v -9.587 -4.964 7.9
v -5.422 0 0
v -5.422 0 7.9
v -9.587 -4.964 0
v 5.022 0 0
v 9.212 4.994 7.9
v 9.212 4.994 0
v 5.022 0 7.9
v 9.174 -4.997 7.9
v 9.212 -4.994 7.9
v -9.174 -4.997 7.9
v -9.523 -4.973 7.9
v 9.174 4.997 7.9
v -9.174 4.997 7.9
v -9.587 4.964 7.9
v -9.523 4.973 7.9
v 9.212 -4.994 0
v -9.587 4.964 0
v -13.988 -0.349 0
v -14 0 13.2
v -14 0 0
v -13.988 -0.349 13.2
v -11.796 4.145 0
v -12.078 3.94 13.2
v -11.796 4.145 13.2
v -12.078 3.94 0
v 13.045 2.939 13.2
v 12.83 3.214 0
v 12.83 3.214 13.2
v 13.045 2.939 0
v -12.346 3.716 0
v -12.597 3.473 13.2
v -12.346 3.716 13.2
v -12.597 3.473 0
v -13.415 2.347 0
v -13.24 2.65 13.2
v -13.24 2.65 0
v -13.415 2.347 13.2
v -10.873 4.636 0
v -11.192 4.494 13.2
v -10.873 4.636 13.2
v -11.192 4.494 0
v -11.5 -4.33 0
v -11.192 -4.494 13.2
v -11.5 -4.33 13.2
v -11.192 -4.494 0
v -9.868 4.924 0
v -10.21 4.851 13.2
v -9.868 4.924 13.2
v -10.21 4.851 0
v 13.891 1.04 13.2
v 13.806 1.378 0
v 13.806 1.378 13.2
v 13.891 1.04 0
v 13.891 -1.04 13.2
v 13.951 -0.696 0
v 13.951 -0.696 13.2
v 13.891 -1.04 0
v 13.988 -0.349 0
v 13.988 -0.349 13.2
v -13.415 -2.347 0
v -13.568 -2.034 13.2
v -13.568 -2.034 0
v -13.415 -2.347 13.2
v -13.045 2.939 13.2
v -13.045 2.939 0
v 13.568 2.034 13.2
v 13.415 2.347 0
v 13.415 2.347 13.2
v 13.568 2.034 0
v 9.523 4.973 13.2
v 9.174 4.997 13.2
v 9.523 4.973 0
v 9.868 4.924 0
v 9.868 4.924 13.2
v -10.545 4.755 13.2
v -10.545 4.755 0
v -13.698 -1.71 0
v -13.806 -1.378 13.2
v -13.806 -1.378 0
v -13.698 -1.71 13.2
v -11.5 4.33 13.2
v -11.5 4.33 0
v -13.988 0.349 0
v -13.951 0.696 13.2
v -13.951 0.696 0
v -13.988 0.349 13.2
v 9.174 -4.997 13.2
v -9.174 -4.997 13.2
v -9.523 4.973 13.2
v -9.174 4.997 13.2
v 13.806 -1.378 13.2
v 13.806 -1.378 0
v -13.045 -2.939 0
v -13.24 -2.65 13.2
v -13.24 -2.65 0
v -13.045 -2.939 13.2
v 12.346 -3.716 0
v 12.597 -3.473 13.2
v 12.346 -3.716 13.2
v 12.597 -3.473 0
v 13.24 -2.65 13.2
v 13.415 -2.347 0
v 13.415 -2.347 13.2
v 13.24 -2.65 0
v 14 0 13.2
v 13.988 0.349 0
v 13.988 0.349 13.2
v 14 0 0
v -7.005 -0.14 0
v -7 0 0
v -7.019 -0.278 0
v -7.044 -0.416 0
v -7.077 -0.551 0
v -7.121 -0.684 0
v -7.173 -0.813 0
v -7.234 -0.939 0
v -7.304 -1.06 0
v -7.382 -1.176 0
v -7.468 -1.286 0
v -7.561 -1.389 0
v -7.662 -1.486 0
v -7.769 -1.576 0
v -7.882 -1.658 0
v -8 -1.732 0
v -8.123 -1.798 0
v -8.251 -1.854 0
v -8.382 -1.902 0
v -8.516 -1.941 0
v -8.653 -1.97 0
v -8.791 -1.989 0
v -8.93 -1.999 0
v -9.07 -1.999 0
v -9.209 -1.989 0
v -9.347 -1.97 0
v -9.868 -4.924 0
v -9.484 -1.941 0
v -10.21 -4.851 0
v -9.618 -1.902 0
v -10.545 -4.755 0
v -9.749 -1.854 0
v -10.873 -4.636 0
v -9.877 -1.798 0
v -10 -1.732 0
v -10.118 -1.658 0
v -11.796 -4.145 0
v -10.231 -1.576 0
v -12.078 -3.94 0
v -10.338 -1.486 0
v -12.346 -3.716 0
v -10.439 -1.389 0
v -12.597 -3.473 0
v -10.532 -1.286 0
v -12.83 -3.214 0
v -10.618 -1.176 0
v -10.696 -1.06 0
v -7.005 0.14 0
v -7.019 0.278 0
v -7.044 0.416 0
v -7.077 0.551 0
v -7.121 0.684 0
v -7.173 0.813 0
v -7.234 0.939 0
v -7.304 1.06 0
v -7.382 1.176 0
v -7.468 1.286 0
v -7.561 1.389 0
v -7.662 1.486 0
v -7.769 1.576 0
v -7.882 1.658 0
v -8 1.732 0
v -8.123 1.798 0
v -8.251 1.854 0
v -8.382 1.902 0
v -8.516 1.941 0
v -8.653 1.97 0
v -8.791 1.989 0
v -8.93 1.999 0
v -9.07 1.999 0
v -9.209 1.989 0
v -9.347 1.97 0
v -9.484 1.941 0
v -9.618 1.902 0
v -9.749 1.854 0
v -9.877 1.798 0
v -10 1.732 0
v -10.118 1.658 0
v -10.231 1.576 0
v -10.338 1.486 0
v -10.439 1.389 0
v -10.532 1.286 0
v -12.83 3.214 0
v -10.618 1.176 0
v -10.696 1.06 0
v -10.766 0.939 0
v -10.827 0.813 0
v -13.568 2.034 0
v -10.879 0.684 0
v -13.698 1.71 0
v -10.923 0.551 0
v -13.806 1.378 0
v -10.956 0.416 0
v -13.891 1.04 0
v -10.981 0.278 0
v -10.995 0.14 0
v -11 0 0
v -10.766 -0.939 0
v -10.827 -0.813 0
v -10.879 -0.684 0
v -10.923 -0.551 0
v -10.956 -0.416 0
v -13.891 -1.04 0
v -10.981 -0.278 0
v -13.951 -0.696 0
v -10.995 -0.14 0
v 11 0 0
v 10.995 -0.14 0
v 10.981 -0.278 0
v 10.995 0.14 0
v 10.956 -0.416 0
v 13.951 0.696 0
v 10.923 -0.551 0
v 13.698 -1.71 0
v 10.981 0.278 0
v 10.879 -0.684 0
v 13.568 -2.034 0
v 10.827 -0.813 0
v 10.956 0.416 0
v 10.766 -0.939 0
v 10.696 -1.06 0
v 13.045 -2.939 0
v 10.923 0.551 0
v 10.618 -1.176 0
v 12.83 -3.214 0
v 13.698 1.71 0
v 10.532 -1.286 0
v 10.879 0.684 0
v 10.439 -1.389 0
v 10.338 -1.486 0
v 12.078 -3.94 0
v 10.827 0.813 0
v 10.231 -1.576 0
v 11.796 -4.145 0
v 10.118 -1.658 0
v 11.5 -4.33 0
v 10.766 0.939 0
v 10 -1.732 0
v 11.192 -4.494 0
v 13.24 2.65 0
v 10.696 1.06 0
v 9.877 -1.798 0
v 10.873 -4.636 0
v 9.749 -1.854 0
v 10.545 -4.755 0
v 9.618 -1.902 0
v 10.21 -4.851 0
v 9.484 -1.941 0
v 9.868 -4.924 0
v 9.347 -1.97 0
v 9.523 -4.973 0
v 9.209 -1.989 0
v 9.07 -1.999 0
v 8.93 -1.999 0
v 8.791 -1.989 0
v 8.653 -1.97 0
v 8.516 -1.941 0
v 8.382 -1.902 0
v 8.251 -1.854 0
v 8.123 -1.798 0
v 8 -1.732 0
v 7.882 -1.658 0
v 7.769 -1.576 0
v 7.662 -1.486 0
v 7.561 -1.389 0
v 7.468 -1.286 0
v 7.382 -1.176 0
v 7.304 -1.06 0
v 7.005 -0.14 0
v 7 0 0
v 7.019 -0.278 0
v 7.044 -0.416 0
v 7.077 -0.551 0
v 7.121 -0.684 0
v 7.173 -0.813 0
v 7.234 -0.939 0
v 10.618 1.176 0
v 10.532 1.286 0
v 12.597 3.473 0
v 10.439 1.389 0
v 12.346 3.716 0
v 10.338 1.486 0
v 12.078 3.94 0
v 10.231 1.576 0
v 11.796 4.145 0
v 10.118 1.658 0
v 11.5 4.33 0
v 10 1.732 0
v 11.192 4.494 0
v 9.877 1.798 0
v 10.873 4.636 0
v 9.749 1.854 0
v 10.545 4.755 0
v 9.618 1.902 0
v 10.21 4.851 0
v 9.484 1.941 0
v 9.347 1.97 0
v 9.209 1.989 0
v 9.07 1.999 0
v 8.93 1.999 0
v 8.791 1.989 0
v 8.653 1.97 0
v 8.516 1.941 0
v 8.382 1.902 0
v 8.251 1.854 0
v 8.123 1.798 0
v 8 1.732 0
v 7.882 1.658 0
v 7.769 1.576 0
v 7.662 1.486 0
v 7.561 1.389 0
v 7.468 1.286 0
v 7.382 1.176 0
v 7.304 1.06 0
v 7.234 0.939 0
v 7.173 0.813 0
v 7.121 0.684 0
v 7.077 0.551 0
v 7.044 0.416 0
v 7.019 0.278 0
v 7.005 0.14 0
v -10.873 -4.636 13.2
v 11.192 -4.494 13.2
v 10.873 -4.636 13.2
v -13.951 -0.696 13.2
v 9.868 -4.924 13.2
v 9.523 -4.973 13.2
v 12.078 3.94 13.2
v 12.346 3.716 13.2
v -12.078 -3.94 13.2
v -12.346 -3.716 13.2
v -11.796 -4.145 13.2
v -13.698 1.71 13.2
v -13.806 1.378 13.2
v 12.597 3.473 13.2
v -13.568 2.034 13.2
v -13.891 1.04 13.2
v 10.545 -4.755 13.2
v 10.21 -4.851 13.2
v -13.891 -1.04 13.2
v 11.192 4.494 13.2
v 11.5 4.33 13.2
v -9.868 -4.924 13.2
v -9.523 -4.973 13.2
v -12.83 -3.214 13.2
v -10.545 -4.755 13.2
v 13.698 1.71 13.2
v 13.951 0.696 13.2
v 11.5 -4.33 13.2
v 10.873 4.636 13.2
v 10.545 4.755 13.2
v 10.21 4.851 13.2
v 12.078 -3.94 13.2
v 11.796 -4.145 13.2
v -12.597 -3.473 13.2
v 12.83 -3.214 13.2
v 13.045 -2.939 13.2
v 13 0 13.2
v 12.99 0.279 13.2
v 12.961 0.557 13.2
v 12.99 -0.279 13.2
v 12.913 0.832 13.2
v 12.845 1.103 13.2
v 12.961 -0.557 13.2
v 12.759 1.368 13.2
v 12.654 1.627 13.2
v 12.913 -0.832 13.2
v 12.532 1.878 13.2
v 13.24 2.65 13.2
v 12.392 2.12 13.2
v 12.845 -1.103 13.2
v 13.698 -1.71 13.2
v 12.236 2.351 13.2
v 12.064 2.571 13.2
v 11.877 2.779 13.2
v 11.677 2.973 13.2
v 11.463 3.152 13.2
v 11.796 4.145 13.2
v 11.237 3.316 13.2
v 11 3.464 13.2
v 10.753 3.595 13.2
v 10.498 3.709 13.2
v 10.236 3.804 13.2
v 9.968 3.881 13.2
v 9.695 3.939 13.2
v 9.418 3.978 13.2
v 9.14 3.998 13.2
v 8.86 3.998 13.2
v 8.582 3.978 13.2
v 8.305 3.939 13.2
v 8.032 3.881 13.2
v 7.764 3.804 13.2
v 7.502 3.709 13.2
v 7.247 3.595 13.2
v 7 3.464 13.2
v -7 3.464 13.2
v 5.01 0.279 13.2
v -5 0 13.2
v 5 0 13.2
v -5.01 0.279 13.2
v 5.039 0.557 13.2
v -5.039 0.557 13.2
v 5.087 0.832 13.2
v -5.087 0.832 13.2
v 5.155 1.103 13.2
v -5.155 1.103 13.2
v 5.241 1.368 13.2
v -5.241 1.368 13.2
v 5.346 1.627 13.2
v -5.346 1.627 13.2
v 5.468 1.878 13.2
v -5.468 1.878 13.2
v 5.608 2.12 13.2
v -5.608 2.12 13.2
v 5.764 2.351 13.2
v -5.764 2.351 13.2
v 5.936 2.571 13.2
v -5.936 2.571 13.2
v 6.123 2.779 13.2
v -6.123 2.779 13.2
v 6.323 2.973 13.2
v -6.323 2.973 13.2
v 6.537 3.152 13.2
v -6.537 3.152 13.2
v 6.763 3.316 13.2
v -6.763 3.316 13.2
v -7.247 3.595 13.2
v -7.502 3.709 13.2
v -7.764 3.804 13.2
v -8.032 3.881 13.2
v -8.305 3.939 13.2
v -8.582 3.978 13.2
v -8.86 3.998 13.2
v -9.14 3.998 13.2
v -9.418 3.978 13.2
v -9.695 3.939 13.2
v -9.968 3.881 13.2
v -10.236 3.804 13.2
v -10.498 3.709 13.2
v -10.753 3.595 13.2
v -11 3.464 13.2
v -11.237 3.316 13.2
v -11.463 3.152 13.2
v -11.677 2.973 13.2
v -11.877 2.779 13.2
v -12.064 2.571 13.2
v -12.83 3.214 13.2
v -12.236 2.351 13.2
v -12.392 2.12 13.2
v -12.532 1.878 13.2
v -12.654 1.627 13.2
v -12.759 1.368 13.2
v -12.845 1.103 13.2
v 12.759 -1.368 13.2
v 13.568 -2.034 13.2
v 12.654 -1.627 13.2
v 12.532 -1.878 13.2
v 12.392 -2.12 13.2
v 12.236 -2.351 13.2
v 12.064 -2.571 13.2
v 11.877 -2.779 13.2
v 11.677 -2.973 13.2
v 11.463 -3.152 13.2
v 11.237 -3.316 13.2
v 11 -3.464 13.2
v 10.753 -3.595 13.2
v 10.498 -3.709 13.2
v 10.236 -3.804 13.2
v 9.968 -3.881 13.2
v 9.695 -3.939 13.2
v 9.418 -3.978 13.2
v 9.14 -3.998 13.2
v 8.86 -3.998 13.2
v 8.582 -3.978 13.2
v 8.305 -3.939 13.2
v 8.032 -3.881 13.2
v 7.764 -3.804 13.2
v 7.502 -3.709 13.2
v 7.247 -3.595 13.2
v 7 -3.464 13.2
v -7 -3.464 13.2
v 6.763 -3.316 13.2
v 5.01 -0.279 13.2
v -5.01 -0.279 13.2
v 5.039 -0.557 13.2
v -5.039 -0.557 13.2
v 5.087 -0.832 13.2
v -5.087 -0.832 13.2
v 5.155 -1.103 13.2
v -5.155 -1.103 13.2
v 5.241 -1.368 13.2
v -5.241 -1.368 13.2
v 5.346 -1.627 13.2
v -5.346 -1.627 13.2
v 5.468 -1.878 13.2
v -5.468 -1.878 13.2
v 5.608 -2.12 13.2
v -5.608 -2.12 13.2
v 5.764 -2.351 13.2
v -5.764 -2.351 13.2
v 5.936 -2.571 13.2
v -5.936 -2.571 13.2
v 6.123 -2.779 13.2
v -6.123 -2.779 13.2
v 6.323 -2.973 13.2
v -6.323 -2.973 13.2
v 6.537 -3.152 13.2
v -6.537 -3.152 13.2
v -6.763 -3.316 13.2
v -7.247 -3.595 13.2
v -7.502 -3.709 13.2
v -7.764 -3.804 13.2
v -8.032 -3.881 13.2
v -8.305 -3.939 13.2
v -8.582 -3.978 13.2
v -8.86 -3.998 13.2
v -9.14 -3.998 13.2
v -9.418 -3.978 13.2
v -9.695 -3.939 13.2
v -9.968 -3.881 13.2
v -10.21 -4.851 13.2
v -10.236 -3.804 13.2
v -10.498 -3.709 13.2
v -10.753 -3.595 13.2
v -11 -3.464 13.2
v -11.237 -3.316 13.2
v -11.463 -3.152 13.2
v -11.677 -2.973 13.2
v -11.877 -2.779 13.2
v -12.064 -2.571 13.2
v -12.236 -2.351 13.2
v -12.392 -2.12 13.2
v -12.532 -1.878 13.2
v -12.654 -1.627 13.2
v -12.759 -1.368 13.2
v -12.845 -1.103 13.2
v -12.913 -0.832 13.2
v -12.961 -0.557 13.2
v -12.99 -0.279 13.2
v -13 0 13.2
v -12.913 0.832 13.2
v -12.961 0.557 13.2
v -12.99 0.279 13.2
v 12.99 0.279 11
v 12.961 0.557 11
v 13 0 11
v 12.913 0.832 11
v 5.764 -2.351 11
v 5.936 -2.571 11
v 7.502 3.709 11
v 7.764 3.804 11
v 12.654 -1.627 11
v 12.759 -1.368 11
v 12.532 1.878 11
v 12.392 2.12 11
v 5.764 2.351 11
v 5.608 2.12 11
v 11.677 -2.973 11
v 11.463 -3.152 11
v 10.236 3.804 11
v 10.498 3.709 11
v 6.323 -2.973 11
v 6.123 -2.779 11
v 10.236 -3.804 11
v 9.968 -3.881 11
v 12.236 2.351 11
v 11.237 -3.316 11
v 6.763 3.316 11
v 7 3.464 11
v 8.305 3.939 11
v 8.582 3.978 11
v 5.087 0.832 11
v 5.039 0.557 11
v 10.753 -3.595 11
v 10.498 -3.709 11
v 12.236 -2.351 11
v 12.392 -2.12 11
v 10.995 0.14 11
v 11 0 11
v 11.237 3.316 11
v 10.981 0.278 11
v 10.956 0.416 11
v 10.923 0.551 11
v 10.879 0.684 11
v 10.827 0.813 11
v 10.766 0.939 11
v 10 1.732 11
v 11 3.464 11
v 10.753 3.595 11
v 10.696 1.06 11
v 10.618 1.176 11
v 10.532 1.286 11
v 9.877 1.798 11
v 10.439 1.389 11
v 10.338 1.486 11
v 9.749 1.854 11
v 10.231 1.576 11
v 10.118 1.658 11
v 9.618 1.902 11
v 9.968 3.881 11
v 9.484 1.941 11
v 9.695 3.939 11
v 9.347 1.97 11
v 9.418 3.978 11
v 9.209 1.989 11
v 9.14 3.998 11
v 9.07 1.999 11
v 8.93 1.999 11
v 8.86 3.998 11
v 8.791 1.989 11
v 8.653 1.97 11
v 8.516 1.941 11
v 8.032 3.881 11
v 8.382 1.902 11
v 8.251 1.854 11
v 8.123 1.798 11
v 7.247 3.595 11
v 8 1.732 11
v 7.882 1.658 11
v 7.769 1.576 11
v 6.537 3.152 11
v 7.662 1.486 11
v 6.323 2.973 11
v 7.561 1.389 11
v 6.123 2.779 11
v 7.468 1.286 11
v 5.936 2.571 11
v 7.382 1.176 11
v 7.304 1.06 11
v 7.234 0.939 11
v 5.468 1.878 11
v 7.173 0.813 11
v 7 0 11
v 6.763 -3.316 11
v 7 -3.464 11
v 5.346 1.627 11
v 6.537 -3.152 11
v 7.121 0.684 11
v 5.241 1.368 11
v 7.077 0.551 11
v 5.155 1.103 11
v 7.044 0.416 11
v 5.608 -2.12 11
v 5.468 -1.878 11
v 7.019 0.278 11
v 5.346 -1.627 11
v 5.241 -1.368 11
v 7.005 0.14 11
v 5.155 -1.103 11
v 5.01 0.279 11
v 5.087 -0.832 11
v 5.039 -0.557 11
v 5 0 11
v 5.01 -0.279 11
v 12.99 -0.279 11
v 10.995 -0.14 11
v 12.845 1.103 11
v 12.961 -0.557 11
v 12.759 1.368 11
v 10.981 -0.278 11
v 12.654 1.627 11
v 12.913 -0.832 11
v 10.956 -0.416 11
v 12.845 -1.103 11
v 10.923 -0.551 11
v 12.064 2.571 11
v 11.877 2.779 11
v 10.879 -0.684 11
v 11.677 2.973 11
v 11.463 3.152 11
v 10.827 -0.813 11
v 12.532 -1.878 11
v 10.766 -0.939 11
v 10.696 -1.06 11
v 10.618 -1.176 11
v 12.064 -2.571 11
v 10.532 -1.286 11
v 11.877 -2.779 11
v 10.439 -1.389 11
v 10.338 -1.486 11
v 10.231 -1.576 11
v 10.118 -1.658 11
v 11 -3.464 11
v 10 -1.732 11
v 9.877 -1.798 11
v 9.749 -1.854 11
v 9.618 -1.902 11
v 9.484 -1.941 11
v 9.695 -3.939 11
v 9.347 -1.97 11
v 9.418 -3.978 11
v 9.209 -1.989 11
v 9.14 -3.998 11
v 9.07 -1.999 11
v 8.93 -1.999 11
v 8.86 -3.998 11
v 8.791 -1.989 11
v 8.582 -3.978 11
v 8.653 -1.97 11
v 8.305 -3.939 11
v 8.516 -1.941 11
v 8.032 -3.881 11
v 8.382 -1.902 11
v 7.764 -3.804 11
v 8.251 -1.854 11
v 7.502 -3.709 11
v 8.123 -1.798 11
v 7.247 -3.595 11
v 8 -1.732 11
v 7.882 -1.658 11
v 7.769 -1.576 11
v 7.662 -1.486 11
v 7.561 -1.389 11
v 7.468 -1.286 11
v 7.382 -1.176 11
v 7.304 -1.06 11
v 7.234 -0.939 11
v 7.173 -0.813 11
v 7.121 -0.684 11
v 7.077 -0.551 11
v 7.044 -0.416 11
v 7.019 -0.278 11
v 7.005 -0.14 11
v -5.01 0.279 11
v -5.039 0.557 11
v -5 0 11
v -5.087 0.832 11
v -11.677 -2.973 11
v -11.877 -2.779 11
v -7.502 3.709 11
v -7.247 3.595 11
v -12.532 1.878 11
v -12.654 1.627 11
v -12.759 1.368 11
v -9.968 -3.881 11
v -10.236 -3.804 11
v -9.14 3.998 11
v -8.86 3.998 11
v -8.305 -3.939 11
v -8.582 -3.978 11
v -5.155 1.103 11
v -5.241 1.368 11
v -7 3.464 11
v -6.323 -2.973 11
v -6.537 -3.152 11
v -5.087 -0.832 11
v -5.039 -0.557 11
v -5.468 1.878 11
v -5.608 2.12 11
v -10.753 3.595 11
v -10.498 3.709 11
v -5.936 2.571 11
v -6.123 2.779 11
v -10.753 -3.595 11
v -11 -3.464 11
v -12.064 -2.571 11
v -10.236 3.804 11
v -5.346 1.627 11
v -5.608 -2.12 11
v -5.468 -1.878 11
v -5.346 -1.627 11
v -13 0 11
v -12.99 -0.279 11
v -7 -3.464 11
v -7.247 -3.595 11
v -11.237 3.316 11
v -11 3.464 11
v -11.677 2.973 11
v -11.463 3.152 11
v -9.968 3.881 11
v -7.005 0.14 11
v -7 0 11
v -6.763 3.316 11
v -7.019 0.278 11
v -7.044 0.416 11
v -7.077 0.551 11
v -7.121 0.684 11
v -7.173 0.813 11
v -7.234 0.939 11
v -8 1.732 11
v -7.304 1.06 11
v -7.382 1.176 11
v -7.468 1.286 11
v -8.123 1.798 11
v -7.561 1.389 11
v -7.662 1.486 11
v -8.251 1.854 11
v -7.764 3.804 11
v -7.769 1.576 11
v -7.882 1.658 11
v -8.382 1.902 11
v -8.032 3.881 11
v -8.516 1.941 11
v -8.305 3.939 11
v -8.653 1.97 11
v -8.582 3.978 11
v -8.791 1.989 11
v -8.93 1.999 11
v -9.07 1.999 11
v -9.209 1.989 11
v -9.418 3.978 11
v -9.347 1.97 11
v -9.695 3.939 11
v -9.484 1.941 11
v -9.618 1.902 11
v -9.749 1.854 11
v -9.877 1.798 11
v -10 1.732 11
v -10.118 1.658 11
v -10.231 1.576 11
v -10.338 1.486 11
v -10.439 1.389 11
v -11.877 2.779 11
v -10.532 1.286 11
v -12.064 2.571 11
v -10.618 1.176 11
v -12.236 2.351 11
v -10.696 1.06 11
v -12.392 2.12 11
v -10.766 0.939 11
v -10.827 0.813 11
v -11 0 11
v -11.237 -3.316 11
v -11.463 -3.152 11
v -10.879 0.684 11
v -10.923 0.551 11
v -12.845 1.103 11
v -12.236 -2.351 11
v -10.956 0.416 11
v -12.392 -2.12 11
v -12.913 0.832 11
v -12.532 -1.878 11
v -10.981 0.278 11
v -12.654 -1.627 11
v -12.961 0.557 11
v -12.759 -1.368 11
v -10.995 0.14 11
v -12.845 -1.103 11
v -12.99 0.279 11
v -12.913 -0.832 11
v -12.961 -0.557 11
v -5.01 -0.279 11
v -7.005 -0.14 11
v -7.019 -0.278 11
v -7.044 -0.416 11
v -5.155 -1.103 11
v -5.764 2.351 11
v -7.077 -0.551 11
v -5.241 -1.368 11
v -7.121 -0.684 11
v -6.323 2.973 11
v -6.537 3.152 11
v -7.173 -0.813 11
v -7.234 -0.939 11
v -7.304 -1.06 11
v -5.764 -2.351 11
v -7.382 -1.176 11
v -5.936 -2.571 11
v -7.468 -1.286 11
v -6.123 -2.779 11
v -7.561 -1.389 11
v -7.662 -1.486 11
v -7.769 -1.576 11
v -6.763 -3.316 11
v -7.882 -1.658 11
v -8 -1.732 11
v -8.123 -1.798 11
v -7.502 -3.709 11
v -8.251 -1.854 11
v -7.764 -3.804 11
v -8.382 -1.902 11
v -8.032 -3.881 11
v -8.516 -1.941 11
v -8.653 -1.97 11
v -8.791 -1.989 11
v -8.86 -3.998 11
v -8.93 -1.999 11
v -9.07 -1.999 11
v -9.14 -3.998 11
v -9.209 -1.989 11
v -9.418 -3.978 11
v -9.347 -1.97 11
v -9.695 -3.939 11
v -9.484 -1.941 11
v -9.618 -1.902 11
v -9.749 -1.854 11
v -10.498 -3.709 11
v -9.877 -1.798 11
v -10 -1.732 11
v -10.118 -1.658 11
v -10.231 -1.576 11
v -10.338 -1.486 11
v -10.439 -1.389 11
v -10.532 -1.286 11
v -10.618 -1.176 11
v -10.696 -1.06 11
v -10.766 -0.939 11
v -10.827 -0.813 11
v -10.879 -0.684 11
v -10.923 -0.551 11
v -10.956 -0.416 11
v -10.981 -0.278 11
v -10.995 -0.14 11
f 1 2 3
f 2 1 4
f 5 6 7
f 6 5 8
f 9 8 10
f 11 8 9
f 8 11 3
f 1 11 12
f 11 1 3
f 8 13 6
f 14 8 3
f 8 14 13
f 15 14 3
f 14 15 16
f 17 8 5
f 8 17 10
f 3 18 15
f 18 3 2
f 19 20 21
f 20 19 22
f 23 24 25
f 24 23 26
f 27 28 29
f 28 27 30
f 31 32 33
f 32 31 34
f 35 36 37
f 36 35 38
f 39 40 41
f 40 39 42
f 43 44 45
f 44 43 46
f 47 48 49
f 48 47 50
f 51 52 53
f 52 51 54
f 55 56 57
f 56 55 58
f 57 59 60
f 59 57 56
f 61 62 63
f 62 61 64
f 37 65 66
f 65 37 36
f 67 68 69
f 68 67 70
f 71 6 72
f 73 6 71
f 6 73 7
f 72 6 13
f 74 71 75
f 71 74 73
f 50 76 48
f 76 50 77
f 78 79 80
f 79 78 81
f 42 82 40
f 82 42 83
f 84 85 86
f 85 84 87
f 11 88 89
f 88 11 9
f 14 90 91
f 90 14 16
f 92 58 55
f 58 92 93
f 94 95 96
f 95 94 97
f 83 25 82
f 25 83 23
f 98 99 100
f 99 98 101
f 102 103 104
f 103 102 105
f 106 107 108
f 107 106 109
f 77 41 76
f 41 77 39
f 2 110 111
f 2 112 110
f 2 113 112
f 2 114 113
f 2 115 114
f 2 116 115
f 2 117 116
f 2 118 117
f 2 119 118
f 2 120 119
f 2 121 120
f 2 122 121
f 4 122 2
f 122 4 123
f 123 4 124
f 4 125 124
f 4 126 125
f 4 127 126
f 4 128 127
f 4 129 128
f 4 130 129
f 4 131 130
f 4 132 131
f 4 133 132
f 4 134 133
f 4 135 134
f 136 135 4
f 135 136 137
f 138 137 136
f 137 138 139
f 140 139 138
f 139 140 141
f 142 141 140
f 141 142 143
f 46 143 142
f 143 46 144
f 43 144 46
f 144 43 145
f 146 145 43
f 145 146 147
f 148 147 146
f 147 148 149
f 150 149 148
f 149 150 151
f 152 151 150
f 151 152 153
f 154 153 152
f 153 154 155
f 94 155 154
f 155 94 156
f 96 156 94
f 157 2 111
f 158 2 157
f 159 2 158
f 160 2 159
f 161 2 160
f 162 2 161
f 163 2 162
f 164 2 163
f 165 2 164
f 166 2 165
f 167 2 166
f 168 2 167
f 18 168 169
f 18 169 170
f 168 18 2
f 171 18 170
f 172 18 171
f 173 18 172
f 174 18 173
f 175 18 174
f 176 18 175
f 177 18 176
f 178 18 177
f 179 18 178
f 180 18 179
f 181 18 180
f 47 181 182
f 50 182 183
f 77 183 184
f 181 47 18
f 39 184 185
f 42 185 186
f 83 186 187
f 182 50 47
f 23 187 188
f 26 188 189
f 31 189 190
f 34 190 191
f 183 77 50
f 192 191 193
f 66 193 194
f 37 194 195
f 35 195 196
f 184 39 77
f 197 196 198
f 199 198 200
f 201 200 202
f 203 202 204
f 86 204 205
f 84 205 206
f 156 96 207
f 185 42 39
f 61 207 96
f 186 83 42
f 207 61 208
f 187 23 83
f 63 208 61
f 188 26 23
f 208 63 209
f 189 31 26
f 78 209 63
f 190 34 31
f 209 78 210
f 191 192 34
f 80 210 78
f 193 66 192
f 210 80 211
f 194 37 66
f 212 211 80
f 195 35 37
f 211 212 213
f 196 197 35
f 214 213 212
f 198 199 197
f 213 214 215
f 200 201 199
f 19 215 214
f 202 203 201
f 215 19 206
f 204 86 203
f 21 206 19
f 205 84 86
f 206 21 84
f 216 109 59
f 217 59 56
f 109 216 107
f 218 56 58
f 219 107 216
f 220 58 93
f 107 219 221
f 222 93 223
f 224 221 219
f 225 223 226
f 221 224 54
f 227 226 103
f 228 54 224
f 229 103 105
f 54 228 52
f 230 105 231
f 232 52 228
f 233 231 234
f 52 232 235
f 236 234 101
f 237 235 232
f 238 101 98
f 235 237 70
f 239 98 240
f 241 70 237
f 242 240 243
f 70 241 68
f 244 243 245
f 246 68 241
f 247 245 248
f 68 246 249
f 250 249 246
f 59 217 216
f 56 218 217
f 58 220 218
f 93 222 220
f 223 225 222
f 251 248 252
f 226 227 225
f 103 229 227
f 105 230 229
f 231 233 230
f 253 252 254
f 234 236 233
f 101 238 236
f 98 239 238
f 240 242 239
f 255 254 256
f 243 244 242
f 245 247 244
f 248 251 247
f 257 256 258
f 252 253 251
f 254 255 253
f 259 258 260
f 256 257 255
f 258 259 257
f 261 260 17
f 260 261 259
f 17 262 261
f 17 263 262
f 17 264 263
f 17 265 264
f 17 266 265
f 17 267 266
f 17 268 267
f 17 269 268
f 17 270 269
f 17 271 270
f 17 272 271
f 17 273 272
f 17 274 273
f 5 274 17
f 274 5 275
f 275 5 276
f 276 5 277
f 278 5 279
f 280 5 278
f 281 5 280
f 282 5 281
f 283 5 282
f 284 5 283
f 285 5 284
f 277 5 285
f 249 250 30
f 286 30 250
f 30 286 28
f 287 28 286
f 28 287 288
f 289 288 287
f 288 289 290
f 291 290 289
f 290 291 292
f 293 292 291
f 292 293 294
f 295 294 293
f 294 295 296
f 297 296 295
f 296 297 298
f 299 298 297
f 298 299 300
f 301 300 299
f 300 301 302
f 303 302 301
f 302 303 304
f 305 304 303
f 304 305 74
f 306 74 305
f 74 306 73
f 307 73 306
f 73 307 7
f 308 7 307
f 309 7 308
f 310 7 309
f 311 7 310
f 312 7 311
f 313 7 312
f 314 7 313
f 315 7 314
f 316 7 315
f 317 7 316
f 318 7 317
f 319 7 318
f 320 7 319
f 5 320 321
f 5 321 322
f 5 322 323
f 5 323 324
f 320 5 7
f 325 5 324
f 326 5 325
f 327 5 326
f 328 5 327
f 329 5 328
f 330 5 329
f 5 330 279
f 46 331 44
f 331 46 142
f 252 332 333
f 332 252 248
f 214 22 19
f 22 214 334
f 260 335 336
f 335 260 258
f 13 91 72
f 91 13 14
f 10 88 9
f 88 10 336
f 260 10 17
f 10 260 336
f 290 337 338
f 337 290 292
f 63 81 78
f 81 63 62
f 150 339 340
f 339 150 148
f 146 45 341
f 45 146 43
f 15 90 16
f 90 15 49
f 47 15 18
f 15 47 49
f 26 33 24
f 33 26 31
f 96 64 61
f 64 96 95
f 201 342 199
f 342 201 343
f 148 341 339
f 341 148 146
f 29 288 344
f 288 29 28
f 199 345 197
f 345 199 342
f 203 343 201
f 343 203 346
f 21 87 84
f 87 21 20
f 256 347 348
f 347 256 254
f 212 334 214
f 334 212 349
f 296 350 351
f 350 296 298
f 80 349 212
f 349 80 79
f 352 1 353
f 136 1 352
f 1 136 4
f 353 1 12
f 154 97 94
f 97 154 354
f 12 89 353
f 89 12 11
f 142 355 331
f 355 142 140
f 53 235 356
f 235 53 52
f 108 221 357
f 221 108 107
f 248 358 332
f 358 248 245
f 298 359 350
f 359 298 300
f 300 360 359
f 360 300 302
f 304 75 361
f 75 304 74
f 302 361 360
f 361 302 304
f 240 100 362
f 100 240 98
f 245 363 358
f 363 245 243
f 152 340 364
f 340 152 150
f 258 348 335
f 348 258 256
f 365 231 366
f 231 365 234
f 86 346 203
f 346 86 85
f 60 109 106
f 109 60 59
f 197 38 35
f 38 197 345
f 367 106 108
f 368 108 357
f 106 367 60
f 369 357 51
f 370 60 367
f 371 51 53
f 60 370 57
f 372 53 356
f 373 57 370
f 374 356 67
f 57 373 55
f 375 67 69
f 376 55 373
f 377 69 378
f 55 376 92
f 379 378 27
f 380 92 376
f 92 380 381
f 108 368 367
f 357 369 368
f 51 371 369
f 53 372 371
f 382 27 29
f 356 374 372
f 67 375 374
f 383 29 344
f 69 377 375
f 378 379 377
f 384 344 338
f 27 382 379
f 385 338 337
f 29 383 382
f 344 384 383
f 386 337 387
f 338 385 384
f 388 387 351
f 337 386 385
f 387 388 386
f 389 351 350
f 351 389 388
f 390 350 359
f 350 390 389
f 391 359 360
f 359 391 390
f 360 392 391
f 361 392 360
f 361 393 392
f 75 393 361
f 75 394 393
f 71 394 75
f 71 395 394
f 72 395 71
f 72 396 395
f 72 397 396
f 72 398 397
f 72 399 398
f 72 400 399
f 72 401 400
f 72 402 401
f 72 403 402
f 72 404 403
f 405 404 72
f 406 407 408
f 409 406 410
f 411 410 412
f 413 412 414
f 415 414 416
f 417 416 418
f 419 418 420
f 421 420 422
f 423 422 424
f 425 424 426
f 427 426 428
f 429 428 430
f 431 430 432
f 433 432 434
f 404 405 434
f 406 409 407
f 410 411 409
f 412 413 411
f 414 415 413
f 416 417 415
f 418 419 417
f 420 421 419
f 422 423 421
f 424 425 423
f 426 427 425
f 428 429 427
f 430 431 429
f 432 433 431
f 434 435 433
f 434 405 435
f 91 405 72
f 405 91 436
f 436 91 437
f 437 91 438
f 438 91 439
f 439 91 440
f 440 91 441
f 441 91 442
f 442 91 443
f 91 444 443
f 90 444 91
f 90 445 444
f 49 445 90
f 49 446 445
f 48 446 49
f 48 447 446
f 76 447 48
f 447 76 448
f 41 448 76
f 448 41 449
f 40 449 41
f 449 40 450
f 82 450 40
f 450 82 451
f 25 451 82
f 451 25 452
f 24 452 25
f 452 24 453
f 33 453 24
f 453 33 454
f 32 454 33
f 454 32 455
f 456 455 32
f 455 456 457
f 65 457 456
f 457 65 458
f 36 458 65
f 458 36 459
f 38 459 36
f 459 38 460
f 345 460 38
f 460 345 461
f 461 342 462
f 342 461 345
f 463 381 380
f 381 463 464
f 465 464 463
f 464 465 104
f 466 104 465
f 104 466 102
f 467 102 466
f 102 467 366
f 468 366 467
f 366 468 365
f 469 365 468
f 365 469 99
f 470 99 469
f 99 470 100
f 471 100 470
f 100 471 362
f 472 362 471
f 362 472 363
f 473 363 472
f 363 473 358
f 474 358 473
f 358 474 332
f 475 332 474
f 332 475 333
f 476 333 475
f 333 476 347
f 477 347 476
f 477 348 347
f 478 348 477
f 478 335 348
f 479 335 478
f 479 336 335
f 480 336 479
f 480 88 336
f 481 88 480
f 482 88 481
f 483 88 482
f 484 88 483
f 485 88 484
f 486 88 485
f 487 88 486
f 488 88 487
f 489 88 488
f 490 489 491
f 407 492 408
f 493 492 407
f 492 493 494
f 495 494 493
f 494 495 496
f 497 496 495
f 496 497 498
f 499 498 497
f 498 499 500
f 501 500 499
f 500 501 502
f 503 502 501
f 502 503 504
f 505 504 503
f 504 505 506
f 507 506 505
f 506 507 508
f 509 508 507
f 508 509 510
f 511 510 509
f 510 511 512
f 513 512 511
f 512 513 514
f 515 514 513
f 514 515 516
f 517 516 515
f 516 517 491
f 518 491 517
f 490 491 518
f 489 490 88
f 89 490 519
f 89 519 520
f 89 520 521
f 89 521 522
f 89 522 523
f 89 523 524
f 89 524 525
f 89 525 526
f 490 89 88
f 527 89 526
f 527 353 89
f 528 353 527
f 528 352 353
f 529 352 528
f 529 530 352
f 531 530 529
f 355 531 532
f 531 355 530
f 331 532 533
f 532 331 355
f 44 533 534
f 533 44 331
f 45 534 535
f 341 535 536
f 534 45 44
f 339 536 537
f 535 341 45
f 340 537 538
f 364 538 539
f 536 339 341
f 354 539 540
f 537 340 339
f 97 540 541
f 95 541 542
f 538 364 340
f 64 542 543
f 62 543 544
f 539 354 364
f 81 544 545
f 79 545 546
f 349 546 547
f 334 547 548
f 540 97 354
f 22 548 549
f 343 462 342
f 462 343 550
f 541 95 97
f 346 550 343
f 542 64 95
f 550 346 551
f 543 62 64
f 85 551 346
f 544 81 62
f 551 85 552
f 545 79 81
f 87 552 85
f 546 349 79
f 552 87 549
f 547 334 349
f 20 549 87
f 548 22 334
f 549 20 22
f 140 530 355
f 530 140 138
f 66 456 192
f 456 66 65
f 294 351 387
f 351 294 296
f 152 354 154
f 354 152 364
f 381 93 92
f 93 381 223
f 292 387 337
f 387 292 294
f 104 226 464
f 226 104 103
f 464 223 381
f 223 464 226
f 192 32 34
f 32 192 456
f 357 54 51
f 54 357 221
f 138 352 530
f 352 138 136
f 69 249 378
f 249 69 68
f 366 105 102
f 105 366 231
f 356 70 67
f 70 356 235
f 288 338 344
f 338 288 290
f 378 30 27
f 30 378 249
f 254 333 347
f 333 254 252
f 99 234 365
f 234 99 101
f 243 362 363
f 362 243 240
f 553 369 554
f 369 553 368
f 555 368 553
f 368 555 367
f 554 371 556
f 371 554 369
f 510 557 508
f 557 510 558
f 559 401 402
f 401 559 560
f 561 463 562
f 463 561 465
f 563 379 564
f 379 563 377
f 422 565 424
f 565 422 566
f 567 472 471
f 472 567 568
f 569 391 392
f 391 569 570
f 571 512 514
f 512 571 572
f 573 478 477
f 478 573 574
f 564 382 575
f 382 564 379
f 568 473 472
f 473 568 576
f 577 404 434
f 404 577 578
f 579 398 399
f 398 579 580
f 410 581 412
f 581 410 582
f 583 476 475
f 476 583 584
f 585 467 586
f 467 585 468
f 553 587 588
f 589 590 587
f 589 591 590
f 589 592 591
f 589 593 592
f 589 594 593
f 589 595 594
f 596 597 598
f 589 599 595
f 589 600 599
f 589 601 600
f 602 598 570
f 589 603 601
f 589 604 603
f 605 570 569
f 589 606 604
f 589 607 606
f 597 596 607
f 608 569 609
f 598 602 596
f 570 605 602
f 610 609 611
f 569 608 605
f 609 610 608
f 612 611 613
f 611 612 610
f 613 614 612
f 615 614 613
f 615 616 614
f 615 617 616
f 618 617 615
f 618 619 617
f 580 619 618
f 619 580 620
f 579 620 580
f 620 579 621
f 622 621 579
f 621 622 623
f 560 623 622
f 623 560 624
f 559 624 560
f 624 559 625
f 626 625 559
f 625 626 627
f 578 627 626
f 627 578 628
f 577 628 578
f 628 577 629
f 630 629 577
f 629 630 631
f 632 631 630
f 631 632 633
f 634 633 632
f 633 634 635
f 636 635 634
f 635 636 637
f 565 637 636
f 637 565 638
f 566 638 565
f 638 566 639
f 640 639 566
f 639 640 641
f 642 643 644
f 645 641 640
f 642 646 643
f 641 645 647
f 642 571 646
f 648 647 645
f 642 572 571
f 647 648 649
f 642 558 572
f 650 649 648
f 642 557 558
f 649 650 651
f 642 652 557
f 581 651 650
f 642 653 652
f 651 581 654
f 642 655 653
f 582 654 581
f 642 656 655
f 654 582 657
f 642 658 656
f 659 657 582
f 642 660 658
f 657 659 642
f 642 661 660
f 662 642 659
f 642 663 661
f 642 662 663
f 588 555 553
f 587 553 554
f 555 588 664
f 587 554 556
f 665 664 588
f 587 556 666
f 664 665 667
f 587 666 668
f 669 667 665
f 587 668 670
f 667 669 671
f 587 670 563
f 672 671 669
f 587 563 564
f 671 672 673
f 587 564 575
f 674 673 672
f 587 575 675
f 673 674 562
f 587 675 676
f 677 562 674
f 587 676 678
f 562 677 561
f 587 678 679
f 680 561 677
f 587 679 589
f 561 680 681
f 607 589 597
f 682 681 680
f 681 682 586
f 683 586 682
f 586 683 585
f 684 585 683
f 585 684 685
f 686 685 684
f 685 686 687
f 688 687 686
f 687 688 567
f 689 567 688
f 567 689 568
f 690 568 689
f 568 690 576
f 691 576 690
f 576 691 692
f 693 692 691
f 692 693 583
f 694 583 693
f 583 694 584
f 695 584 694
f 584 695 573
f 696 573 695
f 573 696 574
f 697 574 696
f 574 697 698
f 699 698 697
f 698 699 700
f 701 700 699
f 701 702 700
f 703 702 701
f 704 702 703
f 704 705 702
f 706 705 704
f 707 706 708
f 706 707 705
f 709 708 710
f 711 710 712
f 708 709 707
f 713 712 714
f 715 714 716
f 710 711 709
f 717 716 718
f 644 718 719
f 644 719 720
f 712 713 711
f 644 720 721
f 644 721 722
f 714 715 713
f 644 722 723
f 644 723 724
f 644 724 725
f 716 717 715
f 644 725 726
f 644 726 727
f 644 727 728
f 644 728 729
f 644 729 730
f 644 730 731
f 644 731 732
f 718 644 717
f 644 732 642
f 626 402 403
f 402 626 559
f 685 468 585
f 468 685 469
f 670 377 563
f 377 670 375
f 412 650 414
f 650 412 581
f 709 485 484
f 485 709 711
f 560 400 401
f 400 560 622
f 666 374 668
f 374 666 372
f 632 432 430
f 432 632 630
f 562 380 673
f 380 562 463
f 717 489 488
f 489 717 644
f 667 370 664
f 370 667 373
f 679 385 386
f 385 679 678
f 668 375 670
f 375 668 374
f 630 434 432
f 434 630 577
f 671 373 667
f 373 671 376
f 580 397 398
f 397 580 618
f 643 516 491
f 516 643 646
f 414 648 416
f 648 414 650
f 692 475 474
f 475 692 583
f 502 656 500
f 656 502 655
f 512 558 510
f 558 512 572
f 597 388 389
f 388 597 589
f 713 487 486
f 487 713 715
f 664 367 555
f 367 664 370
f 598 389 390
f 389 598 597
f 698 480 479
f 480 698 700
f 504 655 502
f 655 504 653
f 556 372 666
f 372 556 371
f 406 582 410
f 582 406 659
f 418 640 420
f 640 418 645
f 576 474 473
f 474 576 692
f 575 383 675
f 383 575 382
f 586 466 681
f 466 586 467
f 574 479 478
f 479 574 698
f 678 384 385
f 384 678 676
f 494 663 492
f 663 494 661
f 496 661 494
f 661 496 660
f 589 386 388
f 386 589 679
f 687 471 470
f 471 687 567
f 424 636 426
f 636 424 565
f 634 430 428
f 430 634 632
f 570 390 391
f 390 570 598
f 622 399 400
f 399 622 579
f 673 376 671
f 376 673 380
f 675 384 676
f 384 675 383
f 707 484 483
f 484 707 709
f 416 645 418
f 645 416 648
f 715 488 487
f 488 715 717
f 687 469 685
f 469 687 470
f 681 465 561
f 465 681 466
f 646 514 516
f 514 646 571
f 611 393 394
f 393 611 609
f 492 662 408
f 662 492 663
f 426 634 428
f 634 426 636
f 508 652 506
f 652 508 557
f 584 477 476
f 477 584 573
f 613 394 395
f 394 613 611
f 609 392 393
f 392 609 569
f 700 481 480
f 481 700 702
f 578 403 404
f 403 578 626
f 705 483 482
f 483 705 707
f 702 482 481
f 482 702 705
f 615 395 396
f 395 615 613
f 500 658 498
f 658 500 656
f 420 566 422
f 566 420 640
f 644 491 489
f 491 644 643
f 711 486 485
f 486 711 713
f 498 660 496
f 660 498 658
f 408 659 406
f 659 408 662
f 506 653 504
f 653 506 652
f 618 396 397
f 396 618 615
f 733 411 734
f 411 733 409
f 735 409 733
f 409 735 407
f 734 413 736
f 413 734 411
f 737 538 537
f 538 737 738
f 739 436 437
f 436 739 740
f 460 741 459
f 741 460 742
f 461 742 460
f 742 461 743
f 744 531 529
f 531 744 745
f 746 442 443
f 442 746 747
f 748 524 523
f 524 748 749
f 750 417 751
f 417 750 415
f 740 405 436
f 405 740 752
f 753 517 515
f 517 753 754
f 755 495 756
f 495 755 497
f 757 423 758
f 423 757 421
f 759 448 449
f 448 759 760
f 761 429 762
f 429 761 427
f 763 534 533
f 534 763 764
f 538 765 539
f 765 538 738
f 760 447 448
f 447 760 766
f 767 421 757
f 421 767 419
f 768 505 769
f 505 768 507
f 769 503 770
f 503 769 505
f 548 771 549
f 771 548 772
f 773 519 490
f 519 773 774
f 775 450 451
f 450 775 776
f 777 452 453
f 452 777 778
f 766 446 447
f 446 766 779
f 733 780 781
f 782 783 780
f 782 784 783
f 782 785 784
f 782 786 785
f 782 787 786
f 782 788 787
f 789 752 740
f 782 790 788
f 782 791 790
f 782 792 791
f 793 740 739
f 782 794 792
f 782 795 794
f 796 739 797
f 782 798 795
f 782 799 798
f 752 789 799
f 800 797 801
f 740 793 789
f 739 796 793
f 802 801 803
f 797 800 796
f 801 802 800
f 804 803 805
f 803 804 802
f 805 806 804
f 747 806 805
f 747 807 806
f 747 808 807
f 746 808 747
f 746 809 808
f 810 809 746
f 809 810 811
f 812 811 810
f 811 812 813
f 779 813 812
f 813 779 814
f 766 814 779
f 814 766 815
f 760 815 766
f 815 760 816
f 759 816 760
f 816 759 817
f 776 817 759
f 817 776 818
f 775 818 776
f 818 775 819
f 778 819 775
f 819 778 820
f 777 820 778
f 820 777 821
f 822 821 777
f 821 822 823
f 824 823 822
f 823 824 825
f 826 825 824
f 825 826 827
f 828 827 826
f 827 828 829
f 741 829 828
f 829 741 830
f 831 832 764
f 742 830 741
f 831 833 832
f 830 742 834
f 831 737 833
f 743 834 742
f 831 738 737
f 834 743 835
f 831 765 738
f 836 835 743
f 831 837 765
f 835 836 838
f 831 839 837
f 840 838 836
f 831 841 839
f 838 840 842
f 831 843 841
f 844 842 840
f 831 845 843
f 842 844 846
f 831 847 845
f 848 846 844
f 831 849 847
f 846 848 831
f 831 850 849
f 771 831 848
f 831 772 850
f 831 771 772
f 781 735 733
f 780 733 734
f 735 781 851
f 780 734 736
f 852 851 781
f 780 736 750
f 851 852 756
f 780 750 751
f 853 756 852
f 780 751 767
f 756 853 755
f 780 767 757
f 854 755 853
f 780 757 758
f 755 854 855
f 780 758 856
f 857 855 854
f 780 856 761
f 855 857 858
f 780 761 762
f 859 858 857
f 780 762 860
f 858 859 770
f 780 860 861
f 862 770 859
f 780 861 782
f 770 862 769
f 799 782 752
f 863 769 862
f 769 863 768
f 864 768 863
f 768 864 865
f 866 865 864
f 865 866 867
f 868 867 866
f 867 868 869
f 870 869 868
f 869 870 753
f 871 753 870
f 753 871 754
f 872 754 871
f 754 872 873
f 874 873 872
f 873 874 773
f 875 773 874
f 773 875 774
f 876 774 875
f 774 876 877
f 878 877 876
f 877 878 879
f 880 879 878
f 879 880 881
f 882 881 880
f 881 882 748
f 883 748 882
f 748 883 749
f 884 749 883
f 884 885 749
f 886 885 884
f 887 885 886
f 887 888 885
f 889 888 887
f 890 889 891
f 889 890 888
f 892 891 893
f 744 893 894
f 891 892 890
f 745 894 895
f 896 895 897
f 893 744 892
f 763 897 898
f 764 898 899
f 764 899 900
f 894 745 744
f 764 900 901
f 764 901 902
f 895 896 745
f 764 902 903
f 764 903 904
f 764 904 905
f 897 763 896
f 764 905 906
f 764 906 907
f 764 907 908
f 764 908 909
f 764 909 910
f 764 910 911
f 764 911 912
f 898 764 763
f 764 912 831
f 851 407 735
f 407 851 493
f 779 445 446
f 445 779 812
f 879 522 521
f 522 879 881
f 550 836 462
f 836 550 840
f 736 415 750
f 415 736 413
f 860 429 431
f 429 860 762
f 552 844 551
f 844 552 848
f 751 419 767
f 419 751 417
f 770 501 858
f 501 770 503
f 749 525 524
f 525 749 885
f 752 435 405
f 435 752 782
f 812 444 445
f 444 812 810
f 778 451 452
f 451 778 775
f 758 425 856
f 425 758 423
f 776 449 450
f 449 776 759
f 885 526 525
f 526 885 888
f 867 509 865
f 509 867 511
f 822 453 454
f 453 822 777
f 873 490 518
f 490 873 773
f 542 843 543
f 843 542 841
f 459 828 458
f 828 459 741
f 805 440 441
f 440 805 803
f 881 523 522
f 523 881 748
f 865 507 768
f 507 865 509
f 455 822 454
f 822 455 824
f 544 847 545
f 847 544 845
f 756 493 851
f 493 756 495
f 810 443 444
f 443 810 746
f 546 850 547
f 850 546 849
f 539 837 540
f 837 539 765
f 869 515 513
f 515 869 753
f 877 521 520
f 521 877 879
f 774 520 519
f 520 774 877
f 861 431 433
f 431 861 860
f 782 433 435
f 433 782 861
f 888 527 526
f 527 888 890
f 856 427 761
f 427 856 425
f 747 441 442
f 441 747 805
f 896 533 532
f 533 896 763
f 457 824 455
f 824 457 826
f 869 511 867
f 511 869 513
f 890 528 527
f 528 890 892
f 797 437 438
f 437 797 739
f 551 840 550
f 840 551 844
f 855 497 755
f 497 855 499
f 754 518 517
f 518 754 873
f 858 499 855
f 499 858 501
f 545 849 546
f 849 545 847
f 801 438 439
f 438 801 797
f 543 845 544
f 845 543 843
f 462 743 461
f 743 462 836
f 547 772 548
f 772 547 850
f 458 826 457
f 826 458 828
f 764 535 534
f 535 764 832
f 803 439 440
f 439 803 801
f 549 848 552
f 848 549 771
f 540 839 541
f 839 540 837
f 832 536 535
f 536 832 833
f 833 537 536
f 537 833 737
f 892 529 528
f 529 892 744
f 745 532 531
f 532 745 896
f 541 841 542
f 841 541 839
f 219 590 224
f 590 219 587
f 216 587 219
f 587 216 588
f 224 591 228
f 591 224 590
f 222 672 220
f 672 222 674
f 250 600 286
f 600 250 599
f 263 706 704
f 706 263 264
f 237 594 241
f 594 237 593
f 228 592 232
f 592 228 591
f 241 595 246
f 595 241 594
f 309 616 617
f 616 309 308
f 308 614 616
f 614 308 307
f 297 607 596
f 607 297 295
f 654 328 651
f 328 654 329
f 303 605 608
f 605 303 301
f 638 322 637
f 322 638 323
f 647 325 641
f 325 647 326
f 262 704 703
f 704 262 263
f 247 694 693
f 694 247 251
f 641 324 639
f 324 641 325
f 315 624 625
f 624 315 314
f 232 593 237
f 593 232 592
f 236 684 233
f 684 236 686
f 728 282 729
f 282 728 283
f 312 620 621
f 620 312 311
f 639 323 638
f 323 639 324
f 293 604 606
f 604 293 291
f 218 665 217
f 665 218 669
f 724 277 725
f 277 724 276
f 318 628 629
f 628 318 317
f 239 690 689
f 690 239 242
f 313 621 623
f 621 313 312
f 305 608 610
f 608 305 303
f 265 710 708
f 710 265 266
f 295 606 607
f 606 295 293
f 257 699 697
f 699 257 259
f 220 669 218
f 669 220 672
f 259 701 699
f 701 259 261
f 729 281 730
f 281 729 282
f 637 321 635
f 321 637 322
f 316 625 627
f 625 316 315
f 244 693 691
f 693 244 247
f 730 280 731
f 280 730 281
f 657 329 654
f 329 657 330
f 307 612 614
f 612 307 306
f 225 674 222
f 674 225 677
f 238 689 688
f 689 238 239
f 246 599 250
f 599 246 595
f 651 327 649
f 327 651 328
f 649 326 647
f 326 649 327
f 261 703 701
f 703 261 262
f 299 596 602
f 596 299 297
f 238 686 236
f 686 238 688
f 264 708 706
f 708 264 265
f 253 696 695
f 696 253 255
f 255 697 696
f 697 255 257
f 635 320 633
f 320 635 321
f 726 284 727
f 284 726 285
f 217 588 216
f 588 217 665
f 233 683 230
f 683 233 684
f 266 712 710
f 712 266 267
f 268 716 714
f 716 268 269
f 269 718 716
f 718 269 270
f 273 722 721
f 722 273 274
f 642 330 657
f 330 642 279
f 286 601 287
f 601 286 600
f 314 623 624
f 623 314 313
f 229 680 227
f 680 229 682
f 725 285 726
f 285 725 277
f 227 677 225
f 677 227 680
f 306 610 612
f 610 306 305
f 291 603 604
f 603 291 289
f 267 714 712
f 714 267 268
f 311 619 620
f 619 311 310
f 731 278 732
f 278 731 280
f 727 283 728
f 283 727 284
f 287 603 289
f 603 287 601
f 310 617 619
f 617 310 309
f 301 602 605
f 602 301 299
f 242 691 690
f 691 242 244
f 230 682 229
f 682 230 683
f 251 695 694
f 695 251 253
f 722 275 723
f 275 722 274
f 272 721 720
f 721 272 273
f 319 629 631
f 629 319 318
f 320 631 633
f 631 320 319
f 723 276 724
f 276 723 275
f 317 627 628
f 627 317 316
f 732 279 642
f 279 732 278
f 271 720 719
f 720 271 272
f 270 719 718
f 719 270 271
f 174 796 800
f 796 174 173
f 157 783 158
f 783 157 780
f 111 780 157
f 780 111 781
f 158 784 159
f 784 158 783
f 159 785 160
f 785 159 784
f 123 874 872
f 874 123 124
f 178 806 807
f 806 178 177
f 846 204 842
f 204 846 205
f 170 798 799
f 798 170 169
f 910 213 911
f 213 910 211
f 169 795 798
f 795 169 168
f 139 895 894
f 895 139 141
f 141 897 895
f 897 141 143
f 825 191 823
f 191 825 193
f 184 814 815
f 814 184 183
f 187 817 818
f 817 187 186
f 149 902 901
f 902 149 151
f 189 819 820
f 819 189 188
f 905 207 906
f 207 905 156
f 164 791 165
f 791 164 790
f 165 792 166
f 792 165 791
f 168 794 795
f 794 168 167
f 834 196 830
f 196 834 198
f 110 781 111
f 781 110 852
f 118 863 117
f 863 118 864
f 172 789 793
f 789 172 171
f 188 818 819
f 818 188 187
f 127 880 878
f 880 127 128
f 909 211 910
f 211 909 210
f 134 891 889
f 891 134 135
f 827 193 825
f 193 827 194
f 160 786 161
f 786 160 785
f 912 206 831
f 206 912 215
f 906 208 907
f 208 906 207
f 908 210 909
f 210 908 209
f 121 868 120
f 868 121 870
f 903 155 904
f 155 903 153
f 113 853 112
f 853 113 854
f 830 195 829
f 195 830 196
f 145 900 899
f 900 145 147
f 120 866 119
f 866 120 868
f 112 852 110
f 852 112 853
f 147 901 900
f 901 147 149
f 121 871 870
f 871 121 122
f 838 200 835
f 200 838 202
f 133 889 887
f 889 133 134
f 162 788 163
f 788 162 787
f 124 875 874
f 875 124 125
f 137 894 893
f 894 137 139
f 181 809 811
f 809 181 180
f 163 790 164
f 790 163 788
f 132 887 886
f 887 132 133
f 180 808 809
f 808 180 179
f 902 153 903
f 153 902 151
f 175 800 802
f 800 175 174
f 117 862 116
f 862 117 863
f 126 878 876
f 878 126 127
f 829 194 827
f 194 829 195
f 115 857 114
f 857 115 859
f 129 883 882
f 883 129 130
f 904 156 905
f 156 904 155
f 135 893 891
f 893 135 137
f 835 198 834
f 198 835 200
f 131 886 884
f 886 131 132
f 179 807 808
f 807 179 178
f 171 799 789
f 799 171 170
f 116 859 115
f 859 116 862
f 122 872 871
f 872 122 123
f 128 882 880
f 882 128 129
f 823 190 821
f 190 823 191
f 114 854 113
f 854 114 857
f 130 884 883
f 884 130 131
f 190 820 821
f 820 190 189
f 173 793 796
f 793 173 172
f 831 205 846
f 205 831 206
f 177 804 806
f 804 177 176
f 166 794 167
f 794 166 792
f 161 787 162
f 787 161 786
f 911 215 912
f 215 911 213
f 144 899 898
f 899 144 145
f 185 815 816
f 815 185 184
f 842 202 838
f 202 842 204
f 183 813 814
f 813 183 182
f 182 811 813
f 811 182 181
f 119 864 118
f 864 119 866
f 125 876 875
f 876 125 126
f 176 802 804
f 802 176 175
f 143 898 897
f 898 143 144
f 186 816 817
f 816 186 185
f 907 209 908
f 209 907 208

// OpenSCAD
$fn = 90;

// VO&S treadle plank fasteners

tube_radius = 8;
screw_head_diameter = 6;
screw_head_radius = screw_head_diameter/2;
screw_head_height = 2;
screw_body_diameter = 4;
screw_body_radius = screw_body_diameter/2;
screw_body_length = 21;
screw_body_clearance = 11;

screw_distance = 18;

h_clearance = 2;
v_clearance = .2;


module outer_hull() {
    hull_height = screw_body_clearance+screw_head_height+v_clearance;
    hull() {
        translate([screw_distance/2,0,0])
            cylinder(h=(hull_height), r=(screw_head_radius+h_clearance));
    
        translate([-screw_distance/2,0,0])
            cylinder(h=(hull_height), r=(screw_head_radius+h_clearance));
    }
}

difference() {
    outer_hull();
    // hole for screwhead to sit in
    translate([screw_distance/2,0,(screw_body_clearance)])
            cylinder(h=100, r=(screw_head_radius+h_clearance/2));
    // hole for other screwhead to sit in
    translate([-screw_distance/2,0,(screw_body_clearance)])
            cylinder(h=100, r=(screw_head_radius+h_clearance/2));
    // through hole for the screw
    translate([screw_distance/2,0,0])
        cylinder(h=200,r=screw_body_radius, center=true);
    // through hole for the other screw
    translate([-screw_distance/2,0,0])
        cylinder(h=200,r=screw_body_radius, center=true);

    // make a place for the frame to fit. The original fasteners were angled,
    // so remove everything between angles 40 and -40 shaped like a frame tube
    // the form to remove is half a cube and half a cylinder (made a bit wider for
    // clearance)
    just_a_bit = .1;
    angle = 40;
    for ( i = [-angle:10:angle]) {
            translate([-v_clearance,0,(tube_radius/2-just_a_bit)])
                rotate([90,0,i])
                    cube([tube_radius, tube_radius, 100], center=true);
        
//        hull() {
//            translate([-v_clearance,0,(tube_radius/2-just_a_bit)])
//                rotate([90,0,i])
//                    cylinder(h=100, r=tube_radius/2, center=true);
//            translate([-v_clearance,0,(tube_radius/4-just_a_bit)])
//                rotate([90,0,i])
//                    cube([tube_radius, tube_radius/2, 100], center=true);
//            translate([v_clearance,0,(tube_radius/2-just_a_bit)])
//                rotate([90,0,i])
//                    cylinder(h=100, r=tube_radius/2, center=true);
//            translate([v_clearance,0,(tube_radius/4-just_a_bit)])
//                rotate([90,0,i])
//                    cube([tube_radius, tube_radius/2, 100], center=true);
//        }
    }
}
